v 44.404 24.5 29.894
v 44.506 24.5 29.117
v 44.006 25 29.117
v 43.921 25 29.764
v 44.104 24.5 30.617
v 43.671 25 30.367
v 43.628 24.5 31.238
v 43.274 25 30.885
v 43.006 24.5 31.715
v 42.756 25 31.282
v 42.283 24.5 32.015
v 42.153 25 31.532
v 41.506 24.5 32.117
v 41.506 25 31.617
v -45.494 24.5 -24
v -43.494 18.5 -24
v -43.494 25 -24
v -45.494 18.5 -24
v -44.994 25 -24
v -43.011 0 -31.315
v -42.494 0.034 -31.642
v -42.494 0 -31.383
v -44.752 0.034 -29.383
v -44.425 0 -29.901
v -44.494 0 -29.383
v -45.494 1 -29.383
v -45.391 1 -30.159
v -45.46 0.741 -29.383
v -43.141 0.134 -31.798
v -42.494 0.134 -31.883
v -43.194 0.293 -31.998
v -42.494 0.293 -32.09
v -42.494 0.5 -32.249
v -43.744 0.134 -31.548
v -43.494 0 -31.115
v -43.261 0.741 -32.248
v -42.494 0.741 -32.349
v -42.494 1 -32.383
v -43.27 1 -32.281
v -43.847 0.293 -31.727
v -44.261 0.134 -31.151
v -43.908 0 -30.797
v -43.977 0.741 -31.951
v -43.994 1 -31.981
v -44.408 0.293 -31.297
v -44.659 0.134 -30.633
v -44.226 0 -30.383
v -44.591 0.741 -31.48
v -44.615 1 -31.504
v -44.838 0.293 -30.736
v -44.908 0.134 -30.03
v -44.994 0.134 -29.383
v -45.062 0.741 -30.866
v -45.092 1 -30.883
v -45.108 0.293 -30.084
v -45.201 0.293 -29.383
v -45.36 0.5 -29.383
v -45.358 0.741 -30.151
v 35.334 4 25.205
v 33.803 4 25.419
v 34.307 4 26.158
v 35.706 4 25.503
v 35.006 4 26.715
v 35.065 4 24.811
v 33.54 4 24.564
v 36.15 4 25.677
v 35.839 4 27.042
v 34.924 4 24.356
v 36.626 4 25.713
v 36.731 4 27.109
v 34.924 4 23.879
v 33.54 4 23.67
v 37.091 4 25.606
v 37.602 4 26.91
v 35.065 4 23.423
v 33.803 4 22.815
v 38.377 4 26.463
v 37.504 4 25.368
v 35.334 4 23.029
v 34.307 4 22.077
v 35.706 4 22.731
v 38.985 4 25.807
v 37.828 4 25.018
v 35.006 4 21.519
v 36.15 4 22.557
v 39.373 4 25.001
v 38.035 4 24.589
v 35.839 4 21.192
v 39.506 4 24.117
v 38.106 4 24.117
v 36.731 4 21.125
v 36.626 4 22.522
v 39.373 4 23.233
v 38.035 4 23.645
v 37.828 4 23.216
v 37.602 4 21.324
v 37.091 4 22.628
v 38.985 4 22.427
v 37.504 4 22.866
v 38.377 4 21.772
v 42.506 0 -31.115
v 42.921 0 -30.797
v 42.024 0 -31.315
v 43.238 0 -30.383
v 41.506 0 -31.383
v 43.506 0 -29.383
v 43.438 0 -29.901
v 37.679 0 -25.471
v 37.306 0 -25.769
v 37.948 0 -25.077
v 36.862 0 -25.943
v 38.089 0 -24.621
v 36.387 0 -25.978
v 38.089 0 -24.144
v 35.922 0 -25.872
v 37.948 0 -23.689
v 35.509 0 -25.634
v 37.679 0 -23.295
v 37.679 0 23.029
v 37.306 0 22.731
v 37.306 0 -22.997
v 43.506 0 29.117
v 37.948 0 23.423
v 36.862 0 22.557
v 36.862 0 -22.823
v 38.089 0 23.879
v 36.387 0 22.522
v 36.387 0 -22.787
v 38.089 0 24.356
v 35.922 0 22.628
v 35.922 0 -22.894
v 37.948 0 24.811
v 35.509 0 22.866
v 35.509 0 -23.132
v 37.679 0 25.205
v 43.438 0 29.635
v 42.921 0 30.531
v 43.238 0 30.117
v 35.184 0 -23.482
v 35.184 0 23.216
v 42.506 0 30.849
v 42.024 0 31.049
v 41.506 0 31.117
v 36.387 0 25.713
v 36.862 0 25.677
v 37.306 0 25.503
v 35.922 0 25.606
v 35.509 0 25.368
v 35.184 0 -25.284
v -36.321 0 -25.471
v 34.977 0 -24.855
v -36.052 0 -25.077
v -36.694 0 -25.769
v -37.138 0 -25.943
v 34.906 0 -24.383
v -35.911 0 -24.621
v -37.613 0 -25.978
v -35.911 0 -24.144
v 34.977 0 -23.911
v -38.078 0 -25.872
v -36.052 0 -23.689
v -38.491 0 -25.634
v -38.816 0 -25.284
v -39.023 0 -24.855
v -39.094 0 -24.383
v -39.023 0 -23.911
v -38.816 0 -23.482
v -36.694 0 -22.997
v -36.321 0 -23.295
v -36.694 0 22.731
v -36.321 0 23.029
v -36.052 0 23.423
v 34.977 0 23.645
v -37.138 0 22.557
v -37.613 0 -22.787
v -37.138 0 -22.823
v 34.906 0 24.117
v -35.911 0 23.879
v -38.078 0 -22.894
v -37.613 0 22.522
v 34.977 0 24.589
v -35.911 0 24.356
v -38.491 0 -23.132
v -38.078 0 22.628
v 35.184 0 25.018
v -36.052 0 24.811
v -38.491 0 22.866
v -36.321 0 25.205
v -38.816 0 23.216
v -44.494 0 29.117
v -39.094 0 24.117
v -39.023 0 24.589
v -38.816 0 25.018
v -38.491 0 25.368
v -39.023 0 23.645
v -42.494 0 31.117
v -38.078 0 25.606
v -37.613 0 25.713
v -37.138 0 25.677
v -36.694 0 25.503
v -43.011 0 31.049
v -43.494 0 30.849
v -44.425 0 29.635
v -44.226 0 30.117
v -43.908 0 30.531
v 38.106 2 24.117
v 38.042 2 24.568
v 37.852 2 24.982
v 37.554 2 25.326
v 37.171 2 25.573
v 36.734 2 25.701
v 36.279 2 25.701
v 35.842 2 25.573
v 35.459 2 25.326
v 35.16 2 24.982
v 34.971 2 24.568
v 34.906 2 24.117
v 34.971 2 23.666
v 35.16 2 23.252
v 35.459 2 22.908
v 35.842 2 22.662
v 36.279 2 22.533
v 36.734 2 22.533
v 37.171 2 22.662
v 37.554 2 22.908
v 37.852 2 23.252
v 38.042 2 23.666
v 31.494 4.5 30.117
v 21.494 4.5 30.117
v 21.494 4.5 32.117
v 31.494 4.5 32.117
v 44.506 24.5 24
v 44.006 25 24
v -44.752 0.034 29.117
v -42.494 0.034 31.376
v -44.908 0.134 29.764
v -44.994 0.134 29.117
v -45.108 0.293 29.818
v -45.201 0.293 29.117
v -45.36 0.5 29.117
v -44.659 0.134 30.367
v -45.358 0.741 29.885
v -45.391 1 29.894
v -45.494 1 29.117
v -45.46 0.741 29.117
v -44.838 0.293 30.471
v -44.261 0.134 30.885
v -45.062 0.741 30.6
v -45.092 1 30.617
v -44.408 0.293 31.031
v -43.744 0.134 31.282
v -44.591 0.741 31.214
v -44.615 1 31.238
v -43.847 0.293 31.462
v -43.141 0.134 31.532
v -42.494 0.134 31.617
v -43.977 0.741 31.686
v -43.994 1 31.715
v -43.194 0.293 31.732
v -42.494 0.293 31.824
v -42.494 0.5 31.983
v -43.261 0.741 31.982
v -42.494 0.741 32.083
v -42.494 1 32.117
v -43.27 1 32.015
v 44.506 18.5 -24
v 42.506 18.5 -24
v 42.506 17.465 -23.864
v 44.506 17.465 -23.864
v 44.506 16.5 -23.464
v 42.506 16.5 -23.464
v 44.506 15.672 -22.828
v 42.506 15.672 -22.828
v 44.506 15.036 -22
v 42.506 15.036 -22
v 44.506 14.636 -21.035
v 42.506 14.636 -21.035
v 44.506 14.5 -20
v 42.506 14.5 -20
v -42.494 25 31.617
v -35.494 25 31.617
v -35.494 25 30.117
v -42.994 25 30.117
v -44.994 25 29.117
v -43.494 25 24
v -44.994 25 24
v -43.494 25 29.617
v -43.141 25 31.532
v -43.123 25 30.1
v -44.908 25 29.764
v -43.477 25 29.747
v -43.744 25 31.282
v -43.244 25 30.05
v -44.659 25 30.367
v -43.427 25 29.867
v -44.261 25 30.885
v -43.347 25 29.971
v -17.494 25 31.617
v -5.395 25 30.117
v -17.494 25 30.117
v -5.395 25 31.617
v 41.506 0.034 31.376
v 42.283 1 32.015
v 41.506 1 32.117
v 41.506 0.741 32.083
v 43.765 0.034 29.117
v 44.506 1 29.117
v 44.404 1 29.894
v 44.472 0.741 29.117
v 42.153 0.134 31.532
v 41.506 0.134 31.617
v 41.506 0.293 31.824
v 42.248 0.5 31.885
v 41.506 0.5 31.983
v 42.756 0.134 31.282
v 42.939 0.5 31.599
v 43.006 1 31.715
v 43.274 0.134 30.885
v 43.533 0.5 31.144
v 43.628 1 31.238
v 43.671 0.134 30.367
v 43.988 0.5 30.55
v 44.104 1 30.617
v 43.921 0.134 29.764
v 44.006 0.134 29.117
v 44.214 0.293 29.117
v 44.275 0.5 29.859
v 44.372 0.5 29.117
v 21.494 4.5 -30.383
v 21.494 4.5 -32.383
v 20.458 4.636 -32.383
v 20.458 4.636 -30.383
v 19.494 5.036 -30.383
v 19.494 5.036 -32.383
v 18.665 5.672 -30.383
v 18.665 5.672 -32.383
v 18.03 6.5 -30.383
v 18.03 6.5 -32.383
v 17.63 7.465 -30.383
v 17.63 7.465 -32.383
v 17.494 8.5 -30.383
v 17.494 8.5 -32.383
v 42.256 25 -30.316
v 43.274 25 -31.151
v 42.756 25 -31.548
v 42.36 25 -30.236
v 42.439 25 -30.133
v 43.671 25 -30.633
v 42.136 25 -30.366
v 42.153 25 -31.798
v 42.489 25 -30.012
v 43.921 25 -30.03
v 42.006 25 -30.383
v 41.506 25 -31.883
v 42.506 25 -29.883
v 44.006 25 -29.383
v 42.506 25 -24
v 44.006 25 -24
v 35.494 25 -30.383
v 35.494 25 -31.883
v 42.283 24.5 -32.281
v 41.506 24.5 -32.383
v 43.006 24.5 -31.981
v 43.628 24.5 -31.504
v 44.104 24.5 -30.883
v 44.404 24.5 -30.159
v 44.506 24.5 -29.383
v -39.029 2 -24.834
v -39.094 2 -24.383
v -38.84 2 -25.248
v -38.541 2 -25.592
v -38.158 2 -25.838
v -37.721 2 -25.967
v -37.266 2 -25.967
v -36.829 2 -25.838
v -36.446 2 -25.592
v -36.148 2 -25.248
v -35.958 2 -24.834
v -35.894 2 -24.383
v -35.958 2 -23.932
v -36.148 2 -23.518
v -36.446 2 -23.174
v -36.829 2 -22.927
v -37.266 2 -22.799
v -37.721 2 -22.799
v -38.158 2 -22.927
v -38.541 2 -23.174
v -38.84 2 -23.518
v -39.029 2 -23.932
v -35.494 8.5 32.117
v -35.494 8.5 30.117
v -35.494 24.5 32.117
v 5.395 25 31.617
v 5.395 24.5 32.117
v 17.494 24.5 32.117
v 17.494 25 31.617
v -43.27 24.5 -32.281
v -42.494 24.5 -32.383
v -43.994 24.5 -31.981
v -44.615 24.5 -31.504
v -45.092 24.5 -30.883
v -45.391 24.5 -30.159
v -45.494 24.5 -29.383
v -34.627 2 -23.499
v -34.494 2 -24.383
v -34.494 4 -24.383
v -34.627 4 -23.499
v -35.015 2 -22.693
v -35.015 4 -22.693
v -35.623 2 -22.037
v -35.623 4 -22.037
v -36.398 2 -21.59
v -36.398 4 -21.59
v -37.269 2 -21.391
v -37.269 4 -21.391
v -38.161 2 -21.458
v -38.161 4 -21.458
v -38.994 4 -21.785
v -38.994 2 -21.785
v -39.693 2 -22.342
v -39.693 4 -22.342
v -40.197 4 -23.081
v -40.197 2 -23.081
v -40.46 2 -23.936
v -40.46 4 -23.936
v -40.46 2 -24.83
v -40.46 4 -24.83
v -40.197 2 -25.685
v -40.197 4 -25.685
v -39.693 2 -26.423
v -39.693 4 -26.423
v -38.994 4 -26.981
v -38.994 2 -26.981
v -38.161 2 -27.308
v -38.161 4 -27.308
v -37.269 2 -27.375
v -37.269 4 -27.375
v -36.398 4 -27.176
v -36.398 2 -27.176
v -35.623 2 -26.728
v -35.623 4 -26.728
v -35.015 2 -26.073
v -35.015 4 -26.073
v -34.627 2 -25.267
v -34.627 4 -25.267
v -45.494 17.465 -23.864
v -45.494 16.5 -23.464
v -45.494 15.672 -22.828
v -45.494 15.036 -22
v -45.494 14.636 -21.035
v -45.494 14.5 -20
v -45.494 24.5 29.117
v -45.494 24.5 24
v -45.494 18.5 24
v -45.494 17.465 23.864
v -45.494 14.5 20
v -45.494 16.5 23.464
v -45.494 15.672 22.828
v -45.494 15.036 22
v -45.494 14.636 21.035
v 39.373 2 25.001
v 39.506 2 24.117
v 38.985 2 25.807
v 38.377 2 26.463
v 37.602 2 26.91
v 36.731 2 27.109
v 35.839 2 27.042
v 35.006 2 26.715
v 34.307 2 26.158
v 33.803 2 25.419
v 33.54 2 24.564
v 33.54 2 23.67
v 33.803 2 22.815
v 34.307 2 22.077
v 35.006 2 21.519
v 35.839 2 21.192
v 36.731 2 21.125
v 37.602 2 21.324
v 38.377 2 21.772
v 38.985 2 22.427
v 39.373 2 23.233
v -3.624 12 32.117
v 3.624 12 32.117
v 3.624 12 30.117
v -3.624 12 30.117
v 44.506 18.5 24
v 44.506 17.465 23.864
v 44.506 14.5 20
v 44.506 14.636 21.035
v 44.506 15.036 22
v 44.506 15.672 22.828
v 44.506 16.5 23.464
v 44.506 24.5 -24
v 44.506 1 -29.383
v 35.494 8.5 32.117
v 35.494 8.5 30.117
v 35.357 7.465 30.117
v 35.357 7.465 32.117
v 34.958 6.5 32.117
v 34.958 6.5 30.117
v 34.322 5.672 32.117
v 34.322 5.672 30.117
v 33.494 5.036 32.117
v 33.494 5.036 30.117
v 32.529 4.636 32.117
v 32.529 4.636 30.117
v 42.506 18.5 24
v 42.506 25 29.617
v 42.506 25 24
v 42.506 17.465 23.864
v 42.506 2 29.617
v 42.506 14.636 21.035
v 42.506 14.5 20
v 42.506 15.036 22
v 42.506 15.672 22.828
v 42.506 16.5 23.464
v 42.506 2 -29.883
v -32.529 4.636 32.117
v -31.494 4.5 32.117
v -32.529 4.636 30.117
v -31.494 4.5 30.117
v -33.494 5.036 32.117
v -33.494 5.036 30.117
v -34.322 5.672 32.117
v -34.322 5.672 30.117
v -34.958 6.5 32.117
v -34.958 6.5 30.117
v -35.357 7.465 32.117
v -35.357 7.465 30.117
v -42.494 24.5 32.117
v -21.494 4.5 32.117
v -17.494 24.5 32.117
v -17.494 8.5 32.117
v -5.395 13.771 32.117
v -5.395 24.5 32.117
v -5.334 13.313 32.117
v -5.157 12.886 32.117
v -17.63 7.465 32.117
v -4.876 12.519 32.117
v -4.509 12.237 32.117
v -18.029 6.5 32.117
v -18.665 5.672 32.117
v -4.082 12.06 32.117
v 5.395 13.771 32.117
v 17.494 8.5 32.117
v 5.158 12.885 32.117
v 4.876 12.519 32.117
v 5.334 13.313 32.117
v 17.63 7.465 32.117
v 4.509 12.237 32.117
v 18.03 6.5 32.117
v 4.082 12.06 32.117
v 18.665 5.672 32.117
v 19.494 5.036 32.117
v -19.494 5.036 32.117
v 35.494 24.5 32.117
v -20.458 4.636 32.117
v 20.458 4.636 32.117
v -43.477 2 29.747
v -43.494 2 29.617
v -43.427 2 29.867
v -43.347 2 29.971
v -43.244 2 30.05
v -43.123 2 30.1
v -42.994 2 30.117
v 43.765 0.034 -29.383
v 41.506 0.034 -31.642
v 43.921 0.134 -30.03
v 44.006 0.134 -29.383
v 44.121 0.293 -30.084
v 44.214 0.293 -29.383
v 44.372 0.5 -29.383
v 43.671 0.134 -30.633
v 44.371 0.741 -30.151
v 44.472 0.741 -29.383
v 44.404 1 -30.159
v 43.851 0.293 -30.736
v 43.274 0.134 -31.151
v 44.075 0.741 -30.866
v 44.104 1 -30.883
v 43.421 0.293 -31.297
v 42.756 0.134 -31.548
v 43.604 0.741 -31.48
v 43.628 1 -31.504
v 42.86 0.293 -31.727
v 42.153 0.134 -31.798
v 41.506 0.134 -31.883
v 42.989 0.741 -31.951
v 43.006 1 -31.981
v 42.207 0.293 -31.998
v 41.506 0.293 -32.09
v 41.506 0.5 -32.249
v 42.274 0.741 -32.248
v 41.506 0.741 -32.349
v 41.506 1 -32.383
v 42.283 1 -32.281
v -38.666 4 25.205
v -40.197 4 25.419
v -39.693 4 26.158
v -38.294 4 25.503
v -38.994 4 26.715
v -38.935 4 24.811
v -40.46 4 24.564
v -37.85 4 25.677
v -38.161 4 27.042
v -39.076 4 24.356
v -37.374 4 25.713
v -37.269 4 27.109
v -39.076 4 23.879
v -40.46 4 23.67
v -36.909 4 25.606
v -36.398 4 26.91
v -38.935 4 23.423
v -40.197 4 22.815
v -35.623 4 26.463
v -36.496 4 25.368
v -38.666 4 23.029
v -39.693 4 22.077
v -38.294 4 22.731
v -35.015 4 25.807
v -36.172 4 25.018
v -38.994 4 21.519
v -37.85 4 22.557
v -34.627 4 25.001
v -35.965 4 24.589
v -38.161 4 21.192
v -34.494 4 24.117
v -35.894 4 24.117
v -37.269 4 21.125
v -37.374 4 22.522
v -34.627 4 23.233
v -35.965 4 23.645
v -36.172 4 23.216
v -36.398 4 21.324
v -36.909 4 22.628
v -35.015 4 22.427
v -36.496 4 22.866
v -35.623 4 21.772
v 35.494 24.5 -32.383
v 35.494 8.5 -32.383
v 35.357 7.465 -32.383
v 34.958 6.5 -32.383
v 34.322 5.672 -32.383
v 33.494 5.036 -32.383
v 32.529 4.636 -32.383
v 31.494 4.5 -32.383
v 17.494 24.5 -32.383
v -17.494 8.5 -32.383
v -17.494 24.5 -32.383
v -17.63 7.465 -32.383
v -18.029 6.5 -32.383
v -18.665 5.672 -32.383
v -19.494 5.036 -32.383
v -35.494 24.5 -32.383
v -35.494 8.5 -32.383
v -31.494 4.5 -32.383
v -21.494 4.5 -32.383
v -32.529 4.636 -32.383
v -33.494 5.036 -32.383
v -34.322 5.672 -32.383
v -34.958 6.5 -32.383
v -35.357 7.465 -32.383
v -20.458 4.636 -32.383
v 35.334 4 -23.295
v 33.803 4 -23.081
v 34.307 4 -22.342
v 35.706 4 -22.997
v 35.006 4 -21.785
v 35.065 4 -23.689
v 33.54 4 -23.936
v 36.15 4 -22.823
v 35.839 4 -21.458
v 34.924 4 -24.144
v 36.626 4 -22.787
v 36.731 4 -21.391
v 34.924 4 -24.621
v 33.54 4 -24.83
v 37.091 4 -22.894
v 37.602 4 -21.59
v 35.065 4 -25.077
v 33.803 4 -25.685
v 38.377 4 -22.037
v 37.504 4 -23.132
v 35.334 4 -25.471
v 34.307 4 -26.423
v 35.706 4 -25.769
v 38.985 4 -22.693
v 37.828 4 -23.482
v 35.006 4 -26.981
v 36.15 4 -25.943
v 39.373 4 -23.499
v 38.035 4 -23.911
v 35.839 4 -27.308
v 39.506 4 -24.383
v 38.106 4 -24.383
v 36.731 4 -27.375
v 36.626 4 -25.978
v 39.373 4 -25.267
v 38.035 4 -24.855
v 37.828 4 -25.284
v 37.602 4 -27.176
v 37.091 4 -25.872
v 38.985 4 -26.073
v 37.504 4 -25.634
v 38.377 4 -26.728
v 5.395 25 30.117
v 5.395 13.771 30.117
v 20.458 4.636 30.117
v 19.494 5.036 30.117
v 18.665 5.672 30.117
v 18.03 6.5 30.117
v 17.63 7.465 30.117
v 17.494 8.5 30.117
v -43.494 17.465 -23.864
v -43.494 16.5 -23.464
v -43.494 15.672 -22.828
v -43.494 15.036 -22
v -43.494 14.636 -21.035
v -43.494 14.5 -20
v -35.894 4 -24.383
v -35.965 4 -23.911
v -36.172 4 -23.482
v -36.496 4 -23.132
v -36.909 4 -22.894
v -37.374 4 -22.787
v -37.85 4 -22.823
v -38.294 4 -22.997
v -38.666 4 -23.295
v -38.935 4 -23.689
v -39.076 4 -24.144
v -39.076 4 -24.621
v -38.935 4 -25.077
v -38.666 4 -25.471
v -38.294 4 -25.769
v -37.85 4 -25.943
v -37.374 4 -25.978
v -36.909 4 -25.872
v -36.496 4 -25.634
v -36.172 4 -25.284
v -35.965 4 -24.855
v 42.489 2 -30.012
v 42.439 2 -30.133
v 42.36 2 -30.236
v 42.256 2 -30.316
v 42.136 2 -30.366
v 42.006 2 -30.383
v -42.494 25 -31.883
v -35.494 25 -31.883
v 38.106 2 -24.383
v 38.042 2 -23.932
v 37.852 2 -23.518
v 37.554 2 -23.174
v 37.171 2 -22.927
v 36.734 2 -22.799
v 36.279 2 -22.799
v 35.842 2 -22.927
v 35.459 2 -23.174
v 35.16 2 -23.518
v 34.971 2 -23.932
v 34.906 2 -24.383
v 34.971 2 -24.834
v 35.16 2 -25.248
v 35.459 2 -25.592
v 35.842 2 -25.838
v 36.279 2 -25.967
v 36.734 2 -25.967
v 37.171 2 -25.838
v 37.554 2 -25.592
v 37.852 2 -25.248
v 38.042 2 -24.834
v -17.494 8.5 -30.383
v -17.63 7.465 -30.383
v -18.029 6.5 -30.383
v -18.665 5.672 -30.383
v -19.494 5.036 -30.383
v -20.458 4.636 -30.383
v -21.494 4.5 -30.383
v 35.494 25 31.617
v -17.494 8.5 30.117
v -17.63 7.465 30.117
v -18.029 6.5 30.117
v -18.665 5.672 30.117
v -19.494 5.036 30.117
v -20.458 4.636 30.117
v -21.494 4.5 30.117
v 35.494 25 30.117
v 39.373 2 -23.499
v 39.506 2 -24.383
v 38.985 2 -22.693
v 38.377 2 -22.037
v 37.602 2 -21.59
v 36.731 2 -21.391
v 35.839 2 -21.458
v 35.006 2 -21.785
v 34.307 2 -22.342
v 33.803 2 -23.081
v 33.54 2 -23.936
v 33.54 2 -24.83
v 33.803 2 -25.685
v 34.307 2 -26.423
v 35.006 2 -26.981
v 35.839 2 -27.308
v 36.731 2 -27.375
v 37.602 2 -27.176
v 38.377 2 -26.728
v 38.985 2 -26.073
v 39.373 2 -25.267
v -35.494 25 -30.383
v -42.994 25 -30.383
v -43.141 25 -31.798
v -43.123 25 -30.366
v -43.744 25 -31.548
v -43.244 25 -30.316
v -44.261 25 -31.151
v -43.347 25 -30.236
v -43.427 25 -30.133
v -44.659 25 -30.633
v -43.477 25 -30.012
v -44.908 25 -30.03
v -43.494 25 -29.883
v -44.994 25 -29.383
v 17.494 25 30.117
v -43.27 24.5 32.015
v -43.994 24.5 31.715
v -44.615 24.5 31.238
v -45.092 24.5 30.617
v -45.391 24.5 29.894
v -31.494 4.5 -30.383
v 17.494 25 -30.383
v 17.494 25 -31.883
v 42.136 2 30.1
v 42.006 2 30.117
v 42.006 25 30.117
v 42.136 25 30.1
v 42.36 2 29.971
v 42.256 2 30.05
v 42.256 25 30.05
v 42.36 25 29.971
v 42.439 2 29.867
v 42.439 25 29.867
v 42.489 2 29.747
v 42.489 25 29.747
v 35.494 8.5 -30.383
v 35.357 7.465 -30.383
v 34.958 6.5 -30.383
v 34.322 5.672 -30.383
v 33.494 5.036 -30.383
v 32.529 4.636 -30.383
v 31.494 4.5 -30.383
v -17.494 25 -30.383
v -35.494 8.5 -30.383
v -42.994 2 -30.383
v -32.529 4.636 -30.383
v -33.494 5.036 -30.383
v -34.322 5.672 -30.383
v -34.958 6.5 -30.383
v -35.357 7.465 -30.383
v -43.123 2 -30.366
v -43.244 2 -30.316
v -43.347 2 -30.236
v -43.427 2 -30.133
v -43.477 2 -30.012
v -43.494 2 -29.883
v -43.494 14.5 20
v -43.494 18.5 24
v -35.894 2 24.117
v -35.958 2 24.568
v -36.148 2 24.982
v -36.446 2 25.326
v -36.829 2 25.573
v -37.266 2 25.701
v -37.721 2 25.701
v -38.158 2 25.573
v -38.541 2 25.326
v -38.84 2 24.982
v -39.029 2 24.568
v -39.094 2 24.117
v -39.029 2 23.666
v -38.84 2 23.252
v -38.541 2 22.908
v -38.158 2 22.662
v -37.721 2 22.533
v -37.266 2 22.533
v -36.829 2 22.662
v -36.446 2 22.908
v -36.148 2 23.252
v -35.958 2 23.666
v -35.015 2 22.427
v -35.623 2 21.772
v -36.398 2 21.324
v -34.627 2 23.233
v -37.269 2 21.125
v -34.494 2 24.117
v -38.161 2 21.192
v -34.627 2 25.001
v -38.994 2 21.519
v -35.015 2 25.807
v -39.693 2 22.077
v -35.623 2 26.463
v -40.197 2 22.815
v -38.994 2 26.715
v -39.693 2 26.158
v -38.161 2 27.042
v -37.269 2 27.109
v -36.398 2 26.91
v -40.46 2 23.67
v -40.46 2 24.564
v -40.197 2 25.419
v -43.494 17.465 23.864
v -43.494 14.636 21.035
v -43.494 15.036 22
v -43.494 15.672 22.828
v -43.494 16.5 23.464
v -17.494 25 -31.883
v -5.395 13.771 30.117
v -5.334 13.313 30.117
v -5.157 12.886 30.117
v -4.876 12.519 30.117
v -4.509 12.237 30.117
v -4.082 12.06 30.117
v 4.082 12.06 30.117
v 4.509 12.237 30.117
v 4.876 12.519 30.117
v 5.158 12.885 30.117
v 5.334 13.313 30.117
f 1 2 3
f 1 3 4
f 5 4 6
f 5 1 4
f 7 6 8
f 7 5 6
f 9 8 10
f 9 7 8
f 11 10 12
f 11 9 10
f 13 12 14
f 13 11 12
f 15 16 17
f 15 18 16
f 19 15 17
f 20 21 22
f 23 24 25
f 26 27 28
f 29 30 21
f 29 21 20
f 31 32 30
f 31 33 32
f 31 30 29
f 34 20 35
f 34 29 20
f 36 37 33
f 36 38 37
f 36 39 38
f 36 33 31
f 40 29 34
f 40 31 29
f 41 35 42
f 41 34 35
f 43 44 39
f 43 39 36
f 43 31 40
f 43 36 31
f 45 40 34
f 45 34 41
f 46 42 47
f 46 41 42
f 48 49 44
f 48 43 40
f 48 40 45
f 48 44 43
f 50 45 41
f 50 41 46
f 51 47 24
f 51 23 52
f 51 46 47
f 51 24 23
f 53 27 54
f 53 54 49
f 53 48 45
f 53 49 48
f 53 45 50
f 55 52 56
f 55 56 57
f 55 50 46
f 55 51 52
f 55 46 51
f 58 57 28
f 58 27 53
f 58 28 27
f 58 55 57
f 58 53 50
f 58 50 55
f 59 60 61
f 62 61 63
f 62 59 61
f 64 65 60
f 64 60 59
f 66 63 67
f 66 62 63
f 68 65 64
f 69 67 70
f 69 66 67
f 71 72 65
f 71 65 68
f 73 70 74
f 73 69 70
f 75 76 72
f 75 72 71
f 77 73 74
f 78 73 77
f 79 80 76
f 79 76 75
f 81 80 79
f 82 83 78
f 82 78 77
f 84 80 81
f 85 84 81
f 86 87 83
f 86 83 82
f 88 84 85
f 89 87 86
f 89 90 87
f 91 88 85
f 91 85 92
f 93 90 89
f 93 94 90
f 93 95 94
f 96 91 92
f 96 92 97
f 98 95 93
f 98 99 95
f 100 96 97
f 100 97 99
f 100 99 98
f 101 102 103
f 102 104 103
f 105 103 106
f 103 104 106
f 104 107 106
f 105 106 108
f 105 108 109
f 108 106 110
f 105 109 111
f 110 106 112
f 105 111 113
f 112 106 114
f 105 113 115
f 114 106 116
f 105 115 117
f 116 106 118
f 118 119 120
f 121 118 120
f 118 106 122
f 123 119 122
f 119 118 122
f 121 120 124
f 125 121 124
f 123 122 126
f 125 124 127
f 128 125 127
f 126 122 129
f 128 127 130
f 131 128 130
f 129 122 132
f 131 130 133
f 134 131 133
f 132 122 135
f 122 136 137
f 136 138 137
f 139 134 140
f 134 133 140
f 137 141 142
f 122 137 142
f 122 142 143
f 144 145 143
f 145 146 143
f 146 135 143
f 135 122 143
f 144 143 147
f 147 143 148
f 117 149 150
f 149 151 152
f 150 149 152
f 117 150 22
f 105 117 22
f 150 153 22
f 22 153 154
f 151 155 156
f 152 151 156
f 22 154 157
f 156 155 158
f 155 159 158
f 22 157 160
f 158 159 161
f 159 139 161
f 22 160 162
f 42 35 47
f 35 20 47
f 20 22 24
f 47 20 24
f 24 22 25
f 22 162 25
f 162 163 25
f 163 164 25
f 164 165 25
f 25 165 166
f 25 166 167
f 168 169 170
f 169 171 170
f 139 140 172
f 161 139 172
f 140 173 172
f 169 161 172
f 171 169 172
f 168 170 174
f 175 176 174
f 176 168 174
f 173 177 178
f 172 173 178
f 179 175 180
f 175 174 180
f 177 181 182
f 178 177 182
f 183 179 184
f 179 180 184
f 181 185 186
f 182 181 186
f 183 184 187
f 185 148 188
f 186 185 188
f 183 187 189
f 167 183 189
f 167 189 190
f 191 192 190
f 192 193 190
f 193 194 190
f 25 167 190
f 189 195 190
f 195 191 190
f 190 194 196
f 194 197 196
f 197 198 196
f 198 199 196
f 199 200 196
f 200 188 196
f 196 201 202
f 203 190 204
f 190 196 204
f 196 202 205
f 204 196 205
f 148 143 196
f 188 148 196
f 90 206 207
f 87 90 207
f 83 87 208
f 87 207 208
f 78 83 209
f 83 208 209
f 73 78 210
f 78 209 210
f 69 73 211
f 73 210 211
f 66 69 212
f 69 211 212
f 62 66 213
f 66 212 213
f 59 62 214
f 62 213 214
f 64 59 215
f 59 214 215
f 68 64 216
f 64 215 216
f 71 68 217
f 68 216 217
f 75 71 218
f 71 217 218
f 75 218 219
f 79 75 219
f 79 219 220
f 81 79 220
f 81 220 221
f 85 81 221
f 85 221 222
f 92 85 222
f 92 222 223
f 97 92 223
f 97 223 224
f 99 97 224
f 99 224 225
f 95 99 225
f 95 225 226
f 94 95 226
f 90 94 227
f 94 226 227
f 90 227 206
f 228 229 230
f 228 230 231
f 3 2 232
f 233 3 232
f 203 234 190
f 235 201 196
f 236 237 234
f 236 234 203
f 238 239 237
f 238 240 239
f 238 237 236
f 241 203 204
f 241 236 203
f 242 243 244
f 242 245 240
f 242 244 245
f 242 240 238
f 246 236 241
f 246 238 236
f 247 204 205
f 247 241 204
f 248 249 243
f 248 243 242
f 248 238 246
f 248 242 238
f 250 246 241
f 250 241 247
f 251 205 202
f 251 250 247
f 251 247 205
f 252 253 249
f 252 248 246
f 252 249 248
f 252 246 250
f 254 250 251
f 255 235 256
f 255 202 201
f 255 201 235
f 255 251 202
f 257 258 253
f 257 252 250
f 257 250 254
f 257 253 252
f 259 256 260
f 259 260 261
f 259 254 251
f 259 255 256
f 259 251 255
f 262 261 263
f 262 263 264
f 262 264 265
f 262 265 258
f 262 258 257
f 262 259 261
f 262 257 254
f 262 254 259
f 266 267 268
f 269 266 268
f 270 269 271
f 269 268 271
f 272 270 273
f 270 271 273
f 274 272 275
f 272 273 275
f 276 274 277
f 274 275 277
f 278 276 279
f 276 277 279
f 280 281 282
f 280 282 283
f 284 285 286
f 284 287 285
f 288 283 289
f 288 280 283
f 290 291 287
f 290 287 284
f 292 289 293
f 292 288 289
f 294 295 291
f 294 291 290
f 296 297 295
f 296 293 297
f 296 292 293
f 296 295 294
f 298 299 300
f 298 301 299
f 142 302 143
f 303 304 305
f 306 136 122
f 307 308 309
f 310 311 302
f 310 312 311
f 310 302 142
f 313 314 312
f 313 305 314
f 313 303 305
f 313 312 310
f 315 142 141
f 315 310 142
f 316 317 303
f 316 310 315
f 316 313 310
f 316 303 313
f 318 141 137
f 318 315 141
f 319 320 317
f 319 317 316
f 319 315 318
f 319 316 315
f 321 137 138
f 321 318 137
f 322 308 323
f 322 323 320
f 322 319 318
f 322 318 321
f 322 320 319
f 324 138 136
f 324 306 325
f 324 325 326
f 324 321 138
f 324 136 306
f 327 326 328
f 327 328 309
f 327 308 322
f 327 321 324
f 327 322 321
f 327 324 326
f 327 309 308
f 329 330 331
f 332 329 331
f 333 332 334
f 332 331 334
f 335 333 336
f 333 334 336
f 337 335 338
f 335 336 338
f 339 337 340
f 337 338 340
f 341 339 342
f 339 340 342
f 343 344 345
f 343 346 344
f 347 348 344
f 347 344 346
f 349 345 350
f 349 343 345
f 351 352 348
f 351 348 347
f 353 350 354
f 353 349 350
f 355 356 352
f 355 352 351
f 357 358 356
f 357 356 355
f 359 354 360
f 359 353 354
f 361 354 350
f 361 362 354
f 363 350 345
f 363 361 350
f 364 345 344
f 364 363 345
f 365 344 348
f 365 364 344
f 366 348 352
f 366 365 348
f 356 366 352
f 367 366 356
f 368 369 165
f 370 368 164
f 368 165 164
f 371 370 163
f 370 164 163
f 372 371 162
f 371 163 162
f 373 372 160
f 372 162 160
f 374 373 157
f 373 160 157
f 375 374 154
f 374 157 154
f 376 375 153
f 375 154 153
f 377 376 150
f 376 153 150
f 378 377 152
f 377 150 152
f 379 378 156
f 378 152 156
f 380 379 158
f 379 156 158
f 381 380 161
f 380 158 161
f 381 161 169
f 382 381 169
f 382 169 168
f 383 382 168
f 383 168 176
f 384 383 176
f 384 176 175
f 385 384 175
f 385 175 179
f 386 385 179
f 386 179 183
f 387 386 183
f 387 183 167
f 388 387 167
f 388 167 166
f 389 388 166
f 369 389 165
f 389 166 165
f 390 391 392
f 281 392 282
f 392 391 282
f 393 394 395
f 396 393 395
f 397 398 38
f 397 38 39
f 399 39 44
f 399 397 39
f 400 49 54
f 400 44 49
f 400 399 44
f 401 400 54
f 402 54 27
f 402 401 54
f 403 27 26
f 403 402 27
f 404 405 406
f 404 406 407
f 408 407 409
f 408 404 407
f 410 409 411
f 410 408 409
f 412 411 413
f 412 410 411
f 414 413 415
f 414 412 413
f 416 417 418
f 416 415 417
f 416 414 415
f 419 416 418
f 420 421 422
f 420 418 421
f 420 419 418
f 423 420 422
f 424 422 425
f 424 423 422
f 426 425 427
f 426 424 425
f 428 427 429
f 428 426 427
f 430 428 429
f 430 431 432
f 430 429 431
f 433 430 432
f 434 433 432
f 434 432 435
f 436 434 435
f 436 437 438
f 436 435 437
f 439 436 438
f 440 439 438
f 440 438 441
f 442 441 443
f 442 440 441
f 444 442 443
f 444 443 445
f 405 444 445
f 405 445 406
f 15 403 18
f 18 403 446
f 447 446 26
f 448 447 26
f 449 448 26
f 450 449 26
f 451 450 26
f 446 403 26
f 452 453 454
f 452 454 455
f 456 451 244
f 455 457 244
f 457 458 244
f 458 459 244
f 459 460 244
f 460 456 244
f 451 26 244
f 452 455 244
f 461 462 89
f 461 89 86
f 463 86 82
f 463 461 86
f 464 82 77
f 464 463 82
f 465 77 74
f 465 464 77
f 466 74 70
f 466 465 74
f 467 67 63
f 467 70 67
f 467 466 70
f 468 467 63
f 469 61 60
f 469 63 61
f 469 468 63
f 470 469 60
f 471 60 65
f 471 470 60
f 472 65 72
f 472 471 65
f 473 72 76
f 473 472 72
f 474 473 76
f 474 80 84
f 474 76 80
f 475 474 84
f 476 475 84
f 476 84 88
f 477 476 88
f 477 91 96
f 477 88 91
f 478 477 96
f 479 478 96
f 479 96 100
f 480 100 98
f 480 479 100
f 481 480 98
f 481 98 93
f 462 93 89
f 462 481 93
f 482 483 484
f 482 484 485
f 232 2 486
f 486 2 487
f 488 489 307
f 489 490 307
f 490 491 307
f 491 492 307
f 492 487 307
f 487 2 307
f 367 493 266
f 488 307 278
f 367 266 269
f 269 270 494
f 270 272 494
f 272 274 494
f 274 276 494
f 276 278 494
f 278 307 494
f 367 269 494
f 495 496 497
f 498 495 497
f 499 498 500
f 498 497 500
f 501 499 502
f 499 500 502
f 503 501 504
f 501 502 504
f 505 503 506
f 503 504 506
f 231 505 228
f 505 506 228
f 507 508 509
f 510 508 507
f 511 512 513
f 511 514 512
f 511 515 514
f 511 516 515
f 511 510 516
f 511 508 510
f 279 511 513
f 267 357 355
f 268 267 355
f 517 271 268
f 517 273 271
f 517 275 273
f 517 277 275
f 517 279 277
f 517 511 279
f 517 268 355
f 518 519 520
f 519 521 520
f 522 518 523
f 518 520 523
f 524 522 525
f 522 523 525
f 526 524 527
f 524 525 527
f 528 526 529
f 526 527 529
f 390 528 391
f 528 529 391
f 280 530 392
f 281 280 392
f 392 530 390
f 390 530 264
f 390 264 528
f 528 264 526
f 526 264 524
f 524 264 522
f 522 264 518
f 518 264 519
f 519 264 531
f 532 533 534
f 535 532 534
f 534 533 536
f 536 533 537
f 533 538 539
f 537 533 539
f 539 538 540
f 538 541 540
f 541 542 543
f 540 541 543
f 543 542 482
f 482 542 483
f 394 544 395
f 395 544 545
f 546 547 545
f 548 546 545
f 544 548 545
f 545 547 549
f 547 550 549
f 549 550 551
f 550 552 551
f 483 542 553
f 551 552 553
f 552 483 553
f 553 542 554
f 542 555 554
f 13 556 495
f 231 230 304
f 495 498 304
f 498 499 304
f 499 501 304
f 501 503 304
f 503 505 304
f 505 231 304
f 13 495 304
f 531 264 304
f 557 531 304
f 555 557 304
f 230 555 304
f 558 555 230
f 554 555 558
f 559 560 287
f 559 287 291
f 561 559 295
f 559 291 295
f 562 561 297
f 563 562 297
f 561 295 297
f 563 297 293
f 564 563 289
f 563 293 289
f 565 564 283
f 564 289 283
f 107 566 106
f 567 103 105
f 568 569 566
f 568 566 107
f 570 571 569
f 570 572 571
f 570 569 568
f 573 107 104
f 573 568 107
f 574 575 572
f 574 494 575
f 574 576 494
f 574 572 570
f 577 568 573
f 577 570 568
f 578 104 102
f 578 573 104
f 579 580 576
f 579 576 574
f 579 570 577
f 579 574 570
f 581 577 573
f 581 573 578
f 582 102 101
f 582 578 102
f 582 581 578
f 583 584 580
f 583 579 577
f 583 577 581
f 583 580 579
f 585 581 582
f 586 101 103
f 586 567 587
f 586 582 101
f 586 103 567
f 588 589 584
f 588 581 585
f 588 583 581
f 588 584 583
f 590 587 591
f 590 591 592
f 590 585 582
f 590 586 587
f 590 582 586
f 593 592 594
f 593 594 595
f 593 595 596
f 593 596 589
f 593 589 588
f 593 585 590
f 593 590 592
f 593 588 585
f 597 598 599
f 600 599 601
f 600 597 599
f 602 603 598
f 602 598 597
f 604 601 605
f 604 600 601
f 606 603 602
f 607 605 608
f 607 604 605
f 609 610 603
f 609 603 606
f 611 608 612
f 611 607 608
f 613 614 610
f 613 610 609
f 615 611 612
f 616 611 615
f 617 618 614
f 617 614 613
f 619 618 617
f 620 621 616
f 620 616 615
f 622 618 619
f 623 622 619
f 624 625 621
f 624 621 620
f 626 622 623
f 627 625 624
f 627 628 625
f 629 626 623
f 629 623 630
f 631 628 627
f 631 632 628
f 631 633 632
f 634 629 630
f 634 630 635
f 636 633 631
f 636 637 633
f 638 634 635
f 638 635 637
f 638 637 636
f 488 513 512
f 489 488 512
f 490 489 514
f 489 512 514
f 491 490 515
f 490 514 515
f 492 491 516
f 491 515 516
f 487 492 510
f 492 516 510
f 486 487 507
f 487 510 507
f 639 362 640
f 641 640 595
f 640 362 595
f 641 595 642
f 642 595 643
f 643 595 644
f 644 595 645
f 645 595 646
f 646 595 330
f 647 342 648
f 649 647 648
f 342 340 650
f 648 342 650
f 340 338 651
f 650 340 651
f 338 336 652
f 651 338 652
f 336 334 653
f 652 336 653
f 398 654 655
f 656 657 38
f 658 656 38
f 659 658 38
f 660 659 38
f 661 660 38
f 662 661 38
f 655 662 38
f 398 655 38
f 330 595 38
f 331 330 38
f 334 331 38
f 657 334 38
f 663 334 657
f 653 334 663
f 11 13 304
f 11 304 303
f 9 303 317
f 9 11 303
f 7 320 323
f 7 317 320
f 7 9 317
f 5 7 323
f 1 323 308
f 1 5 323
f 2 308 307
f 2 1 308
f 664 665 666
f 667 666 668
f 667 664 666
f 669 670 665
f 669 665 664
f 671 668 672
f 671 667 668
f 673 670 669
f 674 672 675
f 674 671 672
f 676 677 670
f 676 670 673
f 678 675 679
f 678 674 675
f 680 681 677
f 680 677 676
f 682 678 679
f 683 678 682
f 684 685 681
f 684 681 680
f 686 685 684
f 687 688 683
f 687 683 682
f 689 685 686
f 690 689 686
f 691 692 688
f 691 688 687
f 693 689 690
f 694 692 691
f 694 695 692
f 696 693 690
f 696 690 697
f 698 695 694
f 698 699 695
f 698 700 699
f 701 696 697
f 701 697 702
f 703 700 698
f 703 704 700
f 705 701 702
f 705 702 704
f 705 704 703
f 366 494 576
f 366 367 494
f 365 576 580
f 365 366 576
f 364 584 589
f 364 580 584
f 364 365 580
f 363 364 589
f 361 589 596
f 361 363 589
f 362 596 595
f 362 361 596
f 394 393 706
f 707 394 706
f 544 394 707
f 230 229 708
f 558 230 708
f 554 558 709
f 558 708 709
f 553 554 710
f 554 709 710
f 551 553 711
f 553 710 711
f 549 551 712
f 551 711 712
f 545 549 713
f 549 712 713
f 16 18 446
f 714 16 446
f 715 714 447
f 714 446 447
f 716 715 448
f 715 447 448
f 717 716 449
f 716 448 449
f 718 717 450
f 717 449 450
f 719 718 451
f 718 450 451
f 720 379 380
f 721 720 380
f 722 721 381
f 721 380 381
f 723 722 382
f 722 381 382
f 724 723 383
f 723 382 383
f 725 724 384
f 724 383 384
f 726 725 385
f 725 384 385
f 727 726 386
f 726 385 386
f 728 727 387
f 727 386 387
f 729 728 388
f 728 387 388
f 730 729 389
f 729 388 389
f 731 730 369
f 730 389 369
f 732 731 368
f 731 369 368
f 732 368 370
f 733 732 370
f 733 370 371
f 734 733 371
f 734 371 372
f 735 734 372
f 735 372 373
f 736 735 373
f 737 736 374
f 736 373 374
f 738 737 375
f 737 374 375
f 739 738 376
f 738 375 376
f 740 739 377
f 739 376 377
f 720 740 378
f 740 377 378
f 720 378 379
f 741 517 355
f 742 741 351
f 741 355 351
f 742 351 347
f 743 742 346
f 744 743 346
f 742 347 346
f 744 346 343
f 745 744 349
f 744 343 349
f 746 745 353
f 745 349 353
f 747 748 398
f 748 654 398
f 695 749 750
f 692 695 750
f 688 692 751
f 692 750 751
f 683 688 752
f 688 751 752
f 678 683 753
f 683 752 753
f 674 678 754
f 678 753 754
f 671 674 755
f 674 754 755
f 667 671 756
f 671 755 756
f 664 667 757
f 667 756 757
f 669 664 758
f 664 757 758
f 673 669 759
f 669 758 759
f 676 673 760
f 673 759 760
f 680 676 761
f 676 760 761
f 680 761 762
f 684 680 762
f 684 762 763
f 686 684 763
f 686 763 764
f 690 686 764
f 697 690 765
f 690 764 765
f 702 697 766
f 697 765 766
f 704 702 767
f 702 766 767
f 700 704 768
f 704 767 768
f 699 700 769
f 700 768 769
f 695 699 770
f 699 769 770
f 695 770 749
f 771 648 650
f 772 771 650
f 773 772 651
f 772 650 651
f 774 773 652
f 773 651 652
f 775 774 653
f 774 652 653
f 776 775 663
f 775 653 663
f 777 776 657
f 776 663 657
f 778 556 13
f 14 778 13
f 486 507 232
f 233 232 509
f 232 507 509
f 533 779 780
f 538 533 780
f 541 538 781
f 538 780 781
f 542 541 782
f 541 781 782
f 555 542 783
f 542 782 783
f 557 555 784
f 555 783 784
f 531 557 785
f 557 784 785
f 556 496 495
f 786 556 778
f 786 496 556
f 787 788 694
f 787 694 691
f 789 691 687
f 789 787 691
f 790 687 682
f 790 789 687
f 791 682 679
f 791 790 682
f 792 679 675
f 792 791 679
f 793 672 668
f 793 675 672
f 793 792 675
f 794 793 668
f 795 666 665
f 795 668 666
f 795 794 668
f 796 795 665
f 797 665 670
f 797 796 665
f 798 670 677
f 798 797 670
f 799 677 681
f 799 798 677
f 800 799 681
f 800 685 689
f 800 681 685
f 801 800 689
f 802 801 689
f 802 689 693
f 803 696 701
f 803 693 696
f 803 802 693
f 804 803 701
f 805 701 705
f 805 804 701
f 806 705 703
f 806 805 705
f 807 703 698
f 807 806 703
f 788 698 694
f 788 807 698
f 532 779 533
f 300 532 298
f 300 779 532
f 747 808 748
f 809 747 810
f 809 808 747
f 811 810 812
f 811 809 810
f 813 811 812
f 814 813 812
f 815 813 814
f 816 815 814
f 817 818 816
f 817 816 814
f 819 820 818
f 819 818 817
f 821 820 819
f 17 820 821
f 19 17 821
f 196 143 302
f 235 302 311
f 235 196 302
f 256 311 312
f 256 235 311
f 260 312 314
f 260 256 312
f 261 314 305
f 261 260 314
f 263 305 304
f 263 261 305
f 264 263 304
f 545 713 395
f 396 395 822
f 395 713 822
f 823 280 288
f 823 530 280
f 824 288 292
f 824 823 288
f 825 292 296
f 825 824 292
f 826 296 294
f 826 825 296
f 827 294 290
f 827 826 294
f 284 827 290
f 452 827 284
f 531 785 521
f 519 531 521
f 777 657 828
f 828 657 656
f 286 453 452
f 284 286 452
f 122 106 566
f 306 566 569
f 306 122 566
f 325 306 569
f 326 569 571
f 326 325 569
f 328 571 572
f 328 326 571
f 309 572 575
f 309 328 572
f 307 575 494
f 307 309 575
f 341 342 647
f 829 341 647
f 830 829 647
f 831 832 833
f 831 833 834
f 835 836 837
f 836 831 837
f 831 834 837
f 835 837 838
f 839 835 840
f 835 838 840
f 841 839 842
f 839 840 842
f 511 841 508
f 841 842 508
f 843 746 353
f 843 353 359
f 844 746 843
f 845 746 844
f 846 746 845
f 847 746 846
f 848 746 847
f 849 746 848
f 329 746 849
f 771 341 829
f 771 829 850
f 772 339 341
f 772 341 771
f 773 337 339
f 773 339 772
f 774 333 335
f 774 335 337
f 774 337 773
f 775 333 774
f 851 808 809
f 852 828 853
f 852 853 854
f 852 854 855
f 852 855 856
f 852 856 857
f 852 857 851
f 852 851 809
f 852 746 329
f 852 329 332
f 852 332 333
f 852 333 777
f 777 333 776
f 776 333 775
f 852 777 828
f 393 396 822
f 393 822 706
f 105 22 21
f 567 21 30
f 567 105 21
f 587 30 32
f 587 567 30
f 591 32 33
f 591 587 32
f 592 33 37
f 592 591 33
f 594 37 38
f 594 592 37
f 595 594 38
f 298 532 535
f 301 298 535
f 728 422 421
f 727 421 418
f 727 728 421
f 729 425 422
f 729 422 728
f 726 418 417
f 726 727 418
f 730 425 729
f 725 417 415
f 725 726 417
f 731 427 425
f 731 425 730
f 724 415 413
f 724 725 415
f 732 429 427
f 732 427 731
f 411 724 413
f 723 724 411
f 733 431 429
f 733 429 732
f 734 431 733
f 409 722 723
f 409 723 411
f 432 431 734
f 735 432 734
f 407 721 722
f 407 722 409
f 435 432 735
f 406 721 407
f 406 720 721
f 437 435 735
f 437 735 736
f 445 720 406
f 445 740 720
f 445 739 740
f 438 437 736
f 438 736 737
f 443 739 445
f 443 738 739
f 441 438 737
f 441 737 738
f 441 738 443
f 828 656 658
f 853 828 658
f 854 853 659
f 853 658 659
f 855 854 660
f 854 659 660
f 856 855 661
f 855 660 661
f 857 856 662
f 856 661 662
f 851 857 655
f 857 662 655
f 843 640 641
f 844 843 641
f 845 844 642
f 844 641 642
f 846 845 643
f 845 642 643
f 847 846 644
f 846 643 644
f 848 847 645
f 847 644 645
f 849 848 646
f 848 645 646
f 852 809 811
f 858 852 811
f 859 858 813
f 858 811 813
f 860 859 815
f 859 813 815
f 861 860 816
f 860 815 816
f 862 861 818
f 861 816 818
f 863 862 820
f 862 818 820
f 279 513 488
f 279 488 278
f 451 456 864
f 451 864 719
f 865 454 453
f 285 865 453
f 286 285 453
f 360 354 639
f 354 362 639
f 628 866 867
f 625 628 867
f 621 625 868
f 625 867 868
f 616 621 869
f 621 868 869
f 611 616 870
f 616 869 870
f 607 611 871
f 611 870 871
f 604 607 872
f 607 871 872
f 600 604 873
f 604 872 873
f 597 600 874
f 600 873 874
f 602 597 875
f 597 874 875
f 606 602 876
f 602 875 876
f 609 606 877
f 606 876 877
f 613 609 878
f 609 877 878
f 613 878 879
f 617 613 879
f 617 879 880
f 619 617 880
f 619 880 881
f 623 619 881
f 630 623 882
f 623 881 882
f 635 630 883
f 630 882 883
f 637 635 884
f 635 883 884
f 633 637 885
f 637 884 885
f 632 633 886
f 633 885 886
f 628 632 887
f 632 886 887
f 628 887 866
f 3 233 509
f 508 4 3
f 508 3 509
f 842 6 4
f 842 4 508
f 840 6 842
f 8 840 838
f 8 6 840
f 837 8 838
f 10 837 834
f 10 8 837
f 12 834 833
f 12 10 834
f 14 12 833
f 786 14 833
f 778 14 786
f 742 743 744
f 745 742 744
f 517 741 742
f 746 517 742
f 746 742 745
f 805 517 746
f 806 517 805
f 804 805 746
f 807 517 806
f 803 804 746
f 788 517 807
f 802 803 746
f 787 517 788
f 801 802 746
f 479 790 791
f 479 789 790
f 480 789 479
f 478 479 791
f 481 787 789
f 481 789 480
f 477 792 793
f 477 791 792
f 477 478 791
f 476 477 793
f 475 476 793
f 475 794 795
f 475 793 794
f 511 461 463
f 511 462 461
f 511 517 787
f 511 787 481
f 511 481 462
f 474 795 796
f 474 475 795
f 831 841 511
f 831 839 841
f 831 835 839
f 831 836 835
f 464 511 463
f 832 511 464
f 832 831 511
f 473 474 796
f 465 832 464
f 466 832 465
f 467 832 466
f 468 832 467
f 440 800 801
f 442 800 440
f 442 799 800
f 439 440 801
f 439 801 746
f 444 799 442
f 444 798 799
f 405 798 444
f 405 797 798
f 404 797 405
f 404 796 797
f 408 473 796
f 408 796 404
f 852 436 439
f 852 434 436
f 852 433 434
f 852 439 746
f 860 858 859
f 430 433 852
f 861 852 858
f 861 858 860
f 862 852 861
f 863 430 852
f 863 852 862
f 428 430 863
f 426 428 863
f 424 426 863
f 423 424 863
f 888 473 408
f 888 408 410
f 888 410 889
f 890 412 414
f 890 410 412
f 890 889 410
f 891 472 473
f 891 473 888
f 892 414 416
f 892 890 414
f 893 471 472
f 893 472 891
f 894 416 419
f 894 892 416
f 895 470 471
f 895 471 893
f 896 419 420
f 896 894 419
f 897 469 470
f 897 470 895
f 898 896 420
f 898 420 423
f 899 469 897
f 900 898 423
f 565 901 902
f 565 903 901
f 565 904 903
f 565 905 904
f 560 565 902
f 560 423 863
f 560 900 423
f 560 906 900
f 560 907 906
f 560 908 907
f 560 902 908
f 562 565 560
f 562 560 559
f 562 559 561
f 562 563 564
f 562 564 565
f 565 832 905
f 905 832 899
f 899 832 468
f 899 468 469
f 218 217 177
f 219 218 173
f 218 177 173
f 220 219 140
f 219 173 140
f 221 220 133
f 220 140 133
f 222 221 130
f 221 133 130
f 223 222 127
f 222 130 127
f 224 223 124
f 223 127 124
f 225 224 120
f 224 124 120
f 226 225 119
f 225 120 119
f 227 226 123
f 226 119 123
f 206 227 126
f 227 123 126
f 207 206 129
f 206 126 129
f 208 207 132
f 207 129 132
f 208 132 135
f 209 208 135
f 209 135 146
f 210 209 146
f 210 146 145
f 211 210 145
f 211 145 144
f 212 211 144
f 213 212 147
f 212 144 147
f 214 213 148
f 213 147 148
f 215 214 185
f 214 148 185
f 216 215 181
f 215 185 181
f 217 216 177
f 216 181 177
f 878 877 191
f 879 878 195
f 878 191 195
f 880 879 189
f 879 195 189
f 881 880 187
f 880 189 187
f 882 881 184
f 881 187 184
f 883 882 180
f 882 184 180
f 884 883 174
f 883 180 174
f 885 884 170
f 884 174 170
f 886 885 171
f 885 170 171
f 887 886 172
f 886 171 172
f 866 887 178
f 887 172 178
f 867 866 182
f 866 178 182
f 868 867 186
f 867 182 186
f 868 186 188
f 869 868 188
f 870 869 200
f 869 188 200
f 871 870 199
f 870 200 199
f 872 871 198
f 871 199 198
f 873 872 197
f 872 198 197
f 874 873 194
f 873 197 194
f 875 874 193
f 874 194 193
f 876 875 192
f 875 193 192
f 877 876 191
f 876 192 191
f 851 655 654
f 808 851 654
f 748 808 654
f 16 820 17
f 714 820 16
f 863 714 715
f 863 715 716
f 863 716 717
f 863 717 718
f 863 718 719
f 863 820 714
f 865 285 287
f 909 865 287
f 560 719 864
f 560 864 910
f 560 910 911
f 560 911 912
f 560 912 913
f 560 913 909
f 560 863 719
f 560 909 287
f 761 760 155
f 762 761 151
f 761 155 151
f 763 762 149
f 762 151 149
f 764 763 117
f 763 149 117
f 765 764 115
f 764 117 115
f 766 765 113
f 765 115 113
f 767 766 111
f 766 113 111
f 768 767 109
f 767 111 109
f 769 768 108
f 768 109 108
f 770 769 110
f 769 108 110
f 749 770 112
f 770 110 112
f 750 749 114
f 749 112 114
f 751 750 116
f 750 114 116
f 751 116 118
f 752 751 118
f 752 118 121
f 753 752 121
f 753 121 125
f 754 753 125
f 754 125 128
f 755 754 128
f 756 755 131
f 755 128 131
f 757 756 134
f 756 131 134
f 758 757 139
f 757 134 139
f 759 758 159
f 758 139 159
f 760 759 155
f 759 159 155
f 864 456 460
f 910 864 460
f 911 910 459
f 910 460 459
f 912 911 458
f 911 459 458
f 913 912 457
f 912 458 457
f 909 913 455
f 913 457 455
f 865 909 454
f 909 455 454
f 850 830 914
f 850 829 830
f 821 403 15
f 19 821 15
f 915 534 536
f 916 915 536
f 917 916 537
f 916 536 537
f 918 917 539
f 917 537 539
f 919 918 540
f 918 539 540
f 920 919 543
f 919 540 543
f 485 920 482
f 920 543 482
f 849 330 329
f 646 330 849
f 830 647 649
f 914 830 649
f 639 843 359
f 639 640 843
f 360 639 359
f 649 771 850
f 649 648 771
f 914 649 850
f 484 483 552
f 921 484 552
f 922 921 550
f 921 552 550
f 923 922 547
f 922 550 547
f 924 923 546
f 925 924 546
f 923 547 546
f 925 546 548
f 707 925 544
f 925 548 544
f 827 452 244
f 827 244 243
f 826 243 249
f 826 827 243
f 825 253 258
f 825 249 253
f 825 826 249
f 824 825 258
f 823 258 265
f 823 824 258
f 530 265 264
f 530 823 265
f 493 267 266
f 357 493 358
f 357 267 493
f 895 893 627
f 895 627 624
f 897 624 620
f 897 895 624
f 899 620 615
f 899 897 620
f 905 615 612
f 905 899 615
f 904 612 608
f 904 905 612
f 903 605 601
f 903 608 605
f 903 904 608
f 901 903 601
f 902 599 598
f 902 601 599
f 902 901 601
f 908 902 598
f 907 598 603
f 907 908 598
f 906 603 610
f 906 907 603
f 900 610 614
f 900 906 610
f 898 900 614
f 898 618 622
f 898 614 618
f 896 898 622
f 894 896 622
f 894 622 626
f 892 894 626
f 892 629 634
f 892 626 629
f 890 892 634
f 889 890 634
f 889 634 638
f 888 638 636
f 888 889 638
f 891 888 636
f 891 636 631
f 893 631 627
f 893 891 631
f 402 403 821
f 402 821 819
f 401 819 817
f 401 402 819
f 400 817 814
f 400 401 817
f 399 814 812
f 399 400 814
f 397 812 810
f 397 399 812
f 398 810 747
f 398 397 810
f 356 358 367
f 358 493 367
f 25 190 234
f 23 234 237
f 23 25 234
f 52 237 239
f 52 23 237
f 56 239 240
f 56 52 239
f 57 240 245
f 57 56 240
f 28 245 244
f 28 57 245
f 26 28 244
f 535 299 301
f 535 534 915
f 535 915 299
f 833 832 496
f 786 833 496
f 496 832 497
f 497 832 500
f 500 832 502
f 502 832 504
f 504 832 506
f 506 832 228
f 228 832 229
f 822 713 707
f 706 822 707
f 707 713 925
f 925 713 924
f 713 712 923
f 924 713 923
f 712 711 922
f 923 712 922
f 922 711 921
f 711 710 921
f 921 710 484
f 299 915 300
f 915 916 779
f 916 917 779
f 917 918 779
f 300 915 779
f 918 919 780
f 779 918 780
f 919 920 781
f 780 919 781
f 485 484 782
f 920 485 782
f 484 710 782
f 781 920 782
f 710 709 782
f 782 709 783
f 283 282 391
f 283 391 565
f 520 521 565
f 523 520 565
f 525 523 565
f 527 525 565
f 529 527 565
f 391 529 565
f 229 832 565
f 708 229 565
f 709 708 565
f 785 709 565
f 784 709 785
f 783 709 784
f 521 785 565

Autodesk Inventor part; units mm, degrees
ref_plane "YZ Plane" through (0, 0, 0) normal (1, 0, 0) x (0, 1, 0)
ref_plane "XZ Plane" through (0, 0, 0) normal (0, 1, 0) x (-1, 0, 0)
ref_plane "XY Plane" through (0, 0, 0) normal (0, 0, 1) x (1, 0, 0)
sketch "Sketch1" plane through (0, 0, 0) normal (0, 1, 0) x (-1, 0, 0)
  line L0 (-42.0064, -29.8829) -> (-42.0064, 29.6171)
  line L1 (-42.0064, 29.6171) -> (42.9936, 29.6171)
  line L2 (42.9936, 29.6171) -> (42.9936, -29.8829)
  line L3 (42.9936, -29.8829) -> (-42.0064, -29.8829)
  circle A0 centre (-36.5064, 24.1171) radius 1.6
  circle A1 centre (-36.5064, -24.3829) radius 1.6
  circle A2 centre (37.4936, -24.3829) radius 1.6
  circle A3 centre (37.4936, 24.1171) radius 1.6
  line L4 (-42.5064, -29.8829) -> (-42.5064, 30.1171)
  line L5 (-42.5064, 30.1171) -> (43.4936, 30.1171)
  line L6 (43.4936, -29.8829) -> (43.4936, 30.1171)
  line L7 (-42.5064, -30.3829) -> (43.4936, -30.3829)
  line L8 (-42.5064, -29.8829) -> (-42.5064, -30.3829)
  line L9 (43.4936, -30.3829) -> (43.4936, -29.8829)
  line L10 (-44.5064, -32.3829) -> (45.4936, -32.3829)
  line L11 (45.4936, -32.3829) -> (45.4936, 32.1171)
  line L12 (45.4936, 32.1171) -> (-44.5064, 32.1171)
  line L13 (-44.5064, 32.1171) -> (-44.5064, -32.3829)
  point P0 (0, 0)
  dimension "d0" = 0.5
  dimension "d1" = 0.5
  dimension "d2" = 0.5
  dimension "d3" = 0.5
  dimension "d4" = 2
  dimension "d5" = 2
  dimension "d6" = 2
  dimension "d7" = 2
extrude "Extrusion1" add sketch "Sketch1" along normal blind 25 contours L13 L12 L11 L10
extrude "Extrusion2" add sketch "Sketch1" along normal blind 2 contours L0 L1 L2 L3 | L4 L5 L6 L9 L7 L8
fillet "Fillet1" radius 3 4 edges at (44.5064, 12.5, 32.1171) (44.5064, 12.5, -32.3829) (-45.4936, 12.5, -32.3829) (-45.4936, 12.5, 32.1171)
fillet "Fillet2" radius 1 8 edges at (43.6277, 0, 31.2384) (44.5064, 0, -0.1329) (43.6277, 0, -31.5042) (-0.4936, 0, -32.3829) (-44.615, 0, -31.5042) (-45.4936, 0, -0.1329) (-44.615, 0, 31.2384) (-0.4936, 0, 32.1171)
chamfer "Chamfer1" distance 0.5 angle 45 8 edges at (-0.4936, 25, 32.1171) (43.6277, 25, 31.2384) (44.5064, 25, -0.1329) (43.6277, 25, -31.5042) (-0.4936, 25, -32.3829) (-44.615, 25, -31.5042) (-45.4936, 25, -0.1329) (-44.615, 25, 31.2384)
fillet "Fillet3" radius 0.5 1 edges at (42.5064, 13.5, 30.1171)
fillet "Fillet4" radius 0.5 1 edges at (42.5064, 13.5, -30.3829)
fillet "Fillet5" radius 0.5 1 edges at (-43.4936, 13.5, -30.3829)
fillet "Fillet6" radius 0.5 1 edges at (-43.4936, 13.5, 30.1171)
sketch "Sketch2" plane through (0, 2, 0) normal (0, 1, 0) x (1, 0, 0)
  circle A0 centre (36.5064, -24.1171) radius 1.6 projected
  circle A1 centre (-37.4936, -24.1171) radius 1.6 projected
  circle A2 centre (-37.4936, 24.3829) radius 1.6 projected
  circle A3 centre (36.5064, 24.3829) radius 1.6 projected
  circle A4 centre (36.5064, -24.1171) radius 3
  circle A5 centre (-37.4936, -24.1171) radius 3
  circle A6 centre (-37.4936, 24.3829) radius 3
  circle A7 centre (36.5064, 24.3829) radius 3
  point P0 (0, 0)
  dimension "d21" = 6
  dimension "d22" = 6
  dimension "d23" = 6
  dimension "d24" = 6
extrude "Extrusion3" add sketch "Sketch2" along normal blind 2
sketch "Sketch3" plane through (41.5064, 1, -32.3829) normal (0, 0, -1) x (-1, 0, 0)
  point P0 (41.5064, -1)
sketch "Sketch4" plane through (-45.4936, 1, -29.3829) normal (-1, 0, 0) x (0, 0, 1)
  line L0 (49.3829, 17.5) -> (9.3829, 17.5) construction
  line L1 (49.3829, 13.5) -> (9.3829, 13.5)
  line L2 (9.3829, 21.5) -> (49.3829, 21.5)
  arc A0 (49.3829, 13.5) -> (49.3829, 21.5) centre (49.3829, 17.5) ccw
  arc A1 (9.3829, 21.5) -> (9.3829, 13.5) centre (9.3829, 17.5) ccw
  line L3 (0, 23.5) -> (58.5, 23.5) projected
  line L4 (5.3829, 17.5) -> (5.3829, 24)
  line L5 (53.3829, 17.5) -> (53.3829, 24)
  line L6 (59, 24) -> (-0.5, 24) projected
  line L7 (5.3829, 24) -> (53.3829, 24)
  line L8 (61.5, 0) -> (61.5, 23.5) projected
  line L9 (29.3829, -1) -> (29.3829, 24)
  point P0 (29.3829, 17.5)
  point P1 (5.3829, 24)
  point P2 (29.3829, 11.5)
  dimension "d27" = 2
  dimension "d28" = 8
  dimension "d38" = 48
  dimension "d39" = 0
extrude "Extrusion4" cut sketch "Sketch4" against normal blind 200 contours L1 L9 L2 A0 | L1 A1 L2 L9
extrude "Extrusion5" cut sketch "Sketch4" against normal blind 200 contours A0 L2 L9 L3 L5 | L2 A1 L4 L3 L9 | L3 L9 L6 L5 | L3 L4 L6 L9
sketch "Sketch5" plane through (41.5064, 1, -32.3829) normal (0, 0, -1) x (-1, 0, 0)
  line L0 (73, 7.5) -> (63, 7.5) construction
  line L1 (73, 11.5) -> (63, 11.5)
  line L2 (63, 3.5) -> (73, 3.5)
  arc A0 (73, 3.5) -> (73, 11.5) centre (73, 7.5) ccw
  arc A1 (63, 11.5) -> (63, 3.5) centre (63, 7.5) ccw
  line L3 (41.5064, -1) -> (41.5064, 23.5)
  line L4 (0, 23.5) -> (84, 23.5) projected
  line L5 (10.0127, 7.5) -> (20.0127, 7.5) construction
  line L6 (10.0127, 11.5) -> (20.0127, 11.5)
  line L7 (20.0127, 3.5) -> (10.0127, 3.5)
  arc A2 (10.0127, 11.5) -> (10.0127, 3.5) centre (10.0127, 7.5) ccw
  arc A3 (20.0127, 3.5) -> (20.0127, 11.5) centre (20.0127, 7.5) ccw
  line L8 (0, -1) -> (84, -1) projected
  line L9 (6.0127, 7.5) -> (6.0127, 24)
  line L10 (84.5, 24) -> (-0.5, 24) projected
  line L11 (24.0127, 7.5) -> (24.0127, 24)
  line L12 (6.0127, 24) -> (24.0127, 24)
  line L13 (59, 7.5) -> (59, 24)
  line L14 (77, 7.5) -> (77, 24)
  line L15 (59, 24) -> (77, 24)
  line L16 (59, 24) -> (59, 15.5271)
  line L17 (59, 15.5271) -> (77, 15.5271)
  line L18 (77, 15.5271) -> (77, 24)
  line L19 (6.0127, 24) -> (24.0127, 24)
  line L20 (59, 24) -> (77, 24)
  line L21 (68, 7.5) -> (68, 24) construction
  line L22 (15.0127, 7.5) -> (15.0127, 24) construction
  line L23 (84, 23.5) -> (84, 0) projected
  point P0 (84, 11.75)
  dimension "d40" = 5
  dimension "d41" = 8
  dimension "d42" = 4.5
  dimension "d45" = 7
extrude "Extrusion6" cut sketch "Sketch5" against normal blind 200 contours A0 L2 A1 L1 | L1 A1 L13 L17 L14 A0 | L17 L13 L4 L14 | L4 L13 L10 L14 | L11 A3 L6 A2 L9 L4 | L4 L9 L10 L11 | A3 L7 A2 L6
sketch "Sketch6" plane through (-42.4936, 1, 32.1171) normal (0, 0, 1) x (1, 0, 0)
  line L0 (46.1174, 12.771) -> (38.8698, 12.771) construction
  line L1 (46.1174, 11) -> (38.8698, 11)
  line L2 (38.8698, 14.5419) -> (46.1174, 14.5419)
  arc A0 (46.1174, 11) -> (46.1174, 14.5419) centre (46.1174, 12.771) ccw
  arc A1 (38.8698, 14.5419) -> (38.8698, 11) centre (38.8698, 12.771) ccw
  line L3 (37.0989, 12.771) -> (37.0989, 32.771)
  line L4 (37.0989, 32.771) -> (47.8884, 32.771)
  line L5 (47.8884, 32.771) -> (47.8884, 12.771)
  arc A2 (21, 3.5) -> (25, 7.5) centre (21, 7.5) ccw projected
  line L6 (84.5, 1) -> (-0.5, 1) projected
  point P0 (42.4936, -1)
  point P1 (42.4936, 12.771)
  point P2 (42.4936, 11)
  point P3 (42.4936, 14.5419)
  dimension "d46" = 3.5419
  dimension "d50" = 20
  dimension "d51" = 10
extrude "Extrusion7" cut sketch "Sketch6" against normal blind 15
properties part number "cutie_3DPrint"
